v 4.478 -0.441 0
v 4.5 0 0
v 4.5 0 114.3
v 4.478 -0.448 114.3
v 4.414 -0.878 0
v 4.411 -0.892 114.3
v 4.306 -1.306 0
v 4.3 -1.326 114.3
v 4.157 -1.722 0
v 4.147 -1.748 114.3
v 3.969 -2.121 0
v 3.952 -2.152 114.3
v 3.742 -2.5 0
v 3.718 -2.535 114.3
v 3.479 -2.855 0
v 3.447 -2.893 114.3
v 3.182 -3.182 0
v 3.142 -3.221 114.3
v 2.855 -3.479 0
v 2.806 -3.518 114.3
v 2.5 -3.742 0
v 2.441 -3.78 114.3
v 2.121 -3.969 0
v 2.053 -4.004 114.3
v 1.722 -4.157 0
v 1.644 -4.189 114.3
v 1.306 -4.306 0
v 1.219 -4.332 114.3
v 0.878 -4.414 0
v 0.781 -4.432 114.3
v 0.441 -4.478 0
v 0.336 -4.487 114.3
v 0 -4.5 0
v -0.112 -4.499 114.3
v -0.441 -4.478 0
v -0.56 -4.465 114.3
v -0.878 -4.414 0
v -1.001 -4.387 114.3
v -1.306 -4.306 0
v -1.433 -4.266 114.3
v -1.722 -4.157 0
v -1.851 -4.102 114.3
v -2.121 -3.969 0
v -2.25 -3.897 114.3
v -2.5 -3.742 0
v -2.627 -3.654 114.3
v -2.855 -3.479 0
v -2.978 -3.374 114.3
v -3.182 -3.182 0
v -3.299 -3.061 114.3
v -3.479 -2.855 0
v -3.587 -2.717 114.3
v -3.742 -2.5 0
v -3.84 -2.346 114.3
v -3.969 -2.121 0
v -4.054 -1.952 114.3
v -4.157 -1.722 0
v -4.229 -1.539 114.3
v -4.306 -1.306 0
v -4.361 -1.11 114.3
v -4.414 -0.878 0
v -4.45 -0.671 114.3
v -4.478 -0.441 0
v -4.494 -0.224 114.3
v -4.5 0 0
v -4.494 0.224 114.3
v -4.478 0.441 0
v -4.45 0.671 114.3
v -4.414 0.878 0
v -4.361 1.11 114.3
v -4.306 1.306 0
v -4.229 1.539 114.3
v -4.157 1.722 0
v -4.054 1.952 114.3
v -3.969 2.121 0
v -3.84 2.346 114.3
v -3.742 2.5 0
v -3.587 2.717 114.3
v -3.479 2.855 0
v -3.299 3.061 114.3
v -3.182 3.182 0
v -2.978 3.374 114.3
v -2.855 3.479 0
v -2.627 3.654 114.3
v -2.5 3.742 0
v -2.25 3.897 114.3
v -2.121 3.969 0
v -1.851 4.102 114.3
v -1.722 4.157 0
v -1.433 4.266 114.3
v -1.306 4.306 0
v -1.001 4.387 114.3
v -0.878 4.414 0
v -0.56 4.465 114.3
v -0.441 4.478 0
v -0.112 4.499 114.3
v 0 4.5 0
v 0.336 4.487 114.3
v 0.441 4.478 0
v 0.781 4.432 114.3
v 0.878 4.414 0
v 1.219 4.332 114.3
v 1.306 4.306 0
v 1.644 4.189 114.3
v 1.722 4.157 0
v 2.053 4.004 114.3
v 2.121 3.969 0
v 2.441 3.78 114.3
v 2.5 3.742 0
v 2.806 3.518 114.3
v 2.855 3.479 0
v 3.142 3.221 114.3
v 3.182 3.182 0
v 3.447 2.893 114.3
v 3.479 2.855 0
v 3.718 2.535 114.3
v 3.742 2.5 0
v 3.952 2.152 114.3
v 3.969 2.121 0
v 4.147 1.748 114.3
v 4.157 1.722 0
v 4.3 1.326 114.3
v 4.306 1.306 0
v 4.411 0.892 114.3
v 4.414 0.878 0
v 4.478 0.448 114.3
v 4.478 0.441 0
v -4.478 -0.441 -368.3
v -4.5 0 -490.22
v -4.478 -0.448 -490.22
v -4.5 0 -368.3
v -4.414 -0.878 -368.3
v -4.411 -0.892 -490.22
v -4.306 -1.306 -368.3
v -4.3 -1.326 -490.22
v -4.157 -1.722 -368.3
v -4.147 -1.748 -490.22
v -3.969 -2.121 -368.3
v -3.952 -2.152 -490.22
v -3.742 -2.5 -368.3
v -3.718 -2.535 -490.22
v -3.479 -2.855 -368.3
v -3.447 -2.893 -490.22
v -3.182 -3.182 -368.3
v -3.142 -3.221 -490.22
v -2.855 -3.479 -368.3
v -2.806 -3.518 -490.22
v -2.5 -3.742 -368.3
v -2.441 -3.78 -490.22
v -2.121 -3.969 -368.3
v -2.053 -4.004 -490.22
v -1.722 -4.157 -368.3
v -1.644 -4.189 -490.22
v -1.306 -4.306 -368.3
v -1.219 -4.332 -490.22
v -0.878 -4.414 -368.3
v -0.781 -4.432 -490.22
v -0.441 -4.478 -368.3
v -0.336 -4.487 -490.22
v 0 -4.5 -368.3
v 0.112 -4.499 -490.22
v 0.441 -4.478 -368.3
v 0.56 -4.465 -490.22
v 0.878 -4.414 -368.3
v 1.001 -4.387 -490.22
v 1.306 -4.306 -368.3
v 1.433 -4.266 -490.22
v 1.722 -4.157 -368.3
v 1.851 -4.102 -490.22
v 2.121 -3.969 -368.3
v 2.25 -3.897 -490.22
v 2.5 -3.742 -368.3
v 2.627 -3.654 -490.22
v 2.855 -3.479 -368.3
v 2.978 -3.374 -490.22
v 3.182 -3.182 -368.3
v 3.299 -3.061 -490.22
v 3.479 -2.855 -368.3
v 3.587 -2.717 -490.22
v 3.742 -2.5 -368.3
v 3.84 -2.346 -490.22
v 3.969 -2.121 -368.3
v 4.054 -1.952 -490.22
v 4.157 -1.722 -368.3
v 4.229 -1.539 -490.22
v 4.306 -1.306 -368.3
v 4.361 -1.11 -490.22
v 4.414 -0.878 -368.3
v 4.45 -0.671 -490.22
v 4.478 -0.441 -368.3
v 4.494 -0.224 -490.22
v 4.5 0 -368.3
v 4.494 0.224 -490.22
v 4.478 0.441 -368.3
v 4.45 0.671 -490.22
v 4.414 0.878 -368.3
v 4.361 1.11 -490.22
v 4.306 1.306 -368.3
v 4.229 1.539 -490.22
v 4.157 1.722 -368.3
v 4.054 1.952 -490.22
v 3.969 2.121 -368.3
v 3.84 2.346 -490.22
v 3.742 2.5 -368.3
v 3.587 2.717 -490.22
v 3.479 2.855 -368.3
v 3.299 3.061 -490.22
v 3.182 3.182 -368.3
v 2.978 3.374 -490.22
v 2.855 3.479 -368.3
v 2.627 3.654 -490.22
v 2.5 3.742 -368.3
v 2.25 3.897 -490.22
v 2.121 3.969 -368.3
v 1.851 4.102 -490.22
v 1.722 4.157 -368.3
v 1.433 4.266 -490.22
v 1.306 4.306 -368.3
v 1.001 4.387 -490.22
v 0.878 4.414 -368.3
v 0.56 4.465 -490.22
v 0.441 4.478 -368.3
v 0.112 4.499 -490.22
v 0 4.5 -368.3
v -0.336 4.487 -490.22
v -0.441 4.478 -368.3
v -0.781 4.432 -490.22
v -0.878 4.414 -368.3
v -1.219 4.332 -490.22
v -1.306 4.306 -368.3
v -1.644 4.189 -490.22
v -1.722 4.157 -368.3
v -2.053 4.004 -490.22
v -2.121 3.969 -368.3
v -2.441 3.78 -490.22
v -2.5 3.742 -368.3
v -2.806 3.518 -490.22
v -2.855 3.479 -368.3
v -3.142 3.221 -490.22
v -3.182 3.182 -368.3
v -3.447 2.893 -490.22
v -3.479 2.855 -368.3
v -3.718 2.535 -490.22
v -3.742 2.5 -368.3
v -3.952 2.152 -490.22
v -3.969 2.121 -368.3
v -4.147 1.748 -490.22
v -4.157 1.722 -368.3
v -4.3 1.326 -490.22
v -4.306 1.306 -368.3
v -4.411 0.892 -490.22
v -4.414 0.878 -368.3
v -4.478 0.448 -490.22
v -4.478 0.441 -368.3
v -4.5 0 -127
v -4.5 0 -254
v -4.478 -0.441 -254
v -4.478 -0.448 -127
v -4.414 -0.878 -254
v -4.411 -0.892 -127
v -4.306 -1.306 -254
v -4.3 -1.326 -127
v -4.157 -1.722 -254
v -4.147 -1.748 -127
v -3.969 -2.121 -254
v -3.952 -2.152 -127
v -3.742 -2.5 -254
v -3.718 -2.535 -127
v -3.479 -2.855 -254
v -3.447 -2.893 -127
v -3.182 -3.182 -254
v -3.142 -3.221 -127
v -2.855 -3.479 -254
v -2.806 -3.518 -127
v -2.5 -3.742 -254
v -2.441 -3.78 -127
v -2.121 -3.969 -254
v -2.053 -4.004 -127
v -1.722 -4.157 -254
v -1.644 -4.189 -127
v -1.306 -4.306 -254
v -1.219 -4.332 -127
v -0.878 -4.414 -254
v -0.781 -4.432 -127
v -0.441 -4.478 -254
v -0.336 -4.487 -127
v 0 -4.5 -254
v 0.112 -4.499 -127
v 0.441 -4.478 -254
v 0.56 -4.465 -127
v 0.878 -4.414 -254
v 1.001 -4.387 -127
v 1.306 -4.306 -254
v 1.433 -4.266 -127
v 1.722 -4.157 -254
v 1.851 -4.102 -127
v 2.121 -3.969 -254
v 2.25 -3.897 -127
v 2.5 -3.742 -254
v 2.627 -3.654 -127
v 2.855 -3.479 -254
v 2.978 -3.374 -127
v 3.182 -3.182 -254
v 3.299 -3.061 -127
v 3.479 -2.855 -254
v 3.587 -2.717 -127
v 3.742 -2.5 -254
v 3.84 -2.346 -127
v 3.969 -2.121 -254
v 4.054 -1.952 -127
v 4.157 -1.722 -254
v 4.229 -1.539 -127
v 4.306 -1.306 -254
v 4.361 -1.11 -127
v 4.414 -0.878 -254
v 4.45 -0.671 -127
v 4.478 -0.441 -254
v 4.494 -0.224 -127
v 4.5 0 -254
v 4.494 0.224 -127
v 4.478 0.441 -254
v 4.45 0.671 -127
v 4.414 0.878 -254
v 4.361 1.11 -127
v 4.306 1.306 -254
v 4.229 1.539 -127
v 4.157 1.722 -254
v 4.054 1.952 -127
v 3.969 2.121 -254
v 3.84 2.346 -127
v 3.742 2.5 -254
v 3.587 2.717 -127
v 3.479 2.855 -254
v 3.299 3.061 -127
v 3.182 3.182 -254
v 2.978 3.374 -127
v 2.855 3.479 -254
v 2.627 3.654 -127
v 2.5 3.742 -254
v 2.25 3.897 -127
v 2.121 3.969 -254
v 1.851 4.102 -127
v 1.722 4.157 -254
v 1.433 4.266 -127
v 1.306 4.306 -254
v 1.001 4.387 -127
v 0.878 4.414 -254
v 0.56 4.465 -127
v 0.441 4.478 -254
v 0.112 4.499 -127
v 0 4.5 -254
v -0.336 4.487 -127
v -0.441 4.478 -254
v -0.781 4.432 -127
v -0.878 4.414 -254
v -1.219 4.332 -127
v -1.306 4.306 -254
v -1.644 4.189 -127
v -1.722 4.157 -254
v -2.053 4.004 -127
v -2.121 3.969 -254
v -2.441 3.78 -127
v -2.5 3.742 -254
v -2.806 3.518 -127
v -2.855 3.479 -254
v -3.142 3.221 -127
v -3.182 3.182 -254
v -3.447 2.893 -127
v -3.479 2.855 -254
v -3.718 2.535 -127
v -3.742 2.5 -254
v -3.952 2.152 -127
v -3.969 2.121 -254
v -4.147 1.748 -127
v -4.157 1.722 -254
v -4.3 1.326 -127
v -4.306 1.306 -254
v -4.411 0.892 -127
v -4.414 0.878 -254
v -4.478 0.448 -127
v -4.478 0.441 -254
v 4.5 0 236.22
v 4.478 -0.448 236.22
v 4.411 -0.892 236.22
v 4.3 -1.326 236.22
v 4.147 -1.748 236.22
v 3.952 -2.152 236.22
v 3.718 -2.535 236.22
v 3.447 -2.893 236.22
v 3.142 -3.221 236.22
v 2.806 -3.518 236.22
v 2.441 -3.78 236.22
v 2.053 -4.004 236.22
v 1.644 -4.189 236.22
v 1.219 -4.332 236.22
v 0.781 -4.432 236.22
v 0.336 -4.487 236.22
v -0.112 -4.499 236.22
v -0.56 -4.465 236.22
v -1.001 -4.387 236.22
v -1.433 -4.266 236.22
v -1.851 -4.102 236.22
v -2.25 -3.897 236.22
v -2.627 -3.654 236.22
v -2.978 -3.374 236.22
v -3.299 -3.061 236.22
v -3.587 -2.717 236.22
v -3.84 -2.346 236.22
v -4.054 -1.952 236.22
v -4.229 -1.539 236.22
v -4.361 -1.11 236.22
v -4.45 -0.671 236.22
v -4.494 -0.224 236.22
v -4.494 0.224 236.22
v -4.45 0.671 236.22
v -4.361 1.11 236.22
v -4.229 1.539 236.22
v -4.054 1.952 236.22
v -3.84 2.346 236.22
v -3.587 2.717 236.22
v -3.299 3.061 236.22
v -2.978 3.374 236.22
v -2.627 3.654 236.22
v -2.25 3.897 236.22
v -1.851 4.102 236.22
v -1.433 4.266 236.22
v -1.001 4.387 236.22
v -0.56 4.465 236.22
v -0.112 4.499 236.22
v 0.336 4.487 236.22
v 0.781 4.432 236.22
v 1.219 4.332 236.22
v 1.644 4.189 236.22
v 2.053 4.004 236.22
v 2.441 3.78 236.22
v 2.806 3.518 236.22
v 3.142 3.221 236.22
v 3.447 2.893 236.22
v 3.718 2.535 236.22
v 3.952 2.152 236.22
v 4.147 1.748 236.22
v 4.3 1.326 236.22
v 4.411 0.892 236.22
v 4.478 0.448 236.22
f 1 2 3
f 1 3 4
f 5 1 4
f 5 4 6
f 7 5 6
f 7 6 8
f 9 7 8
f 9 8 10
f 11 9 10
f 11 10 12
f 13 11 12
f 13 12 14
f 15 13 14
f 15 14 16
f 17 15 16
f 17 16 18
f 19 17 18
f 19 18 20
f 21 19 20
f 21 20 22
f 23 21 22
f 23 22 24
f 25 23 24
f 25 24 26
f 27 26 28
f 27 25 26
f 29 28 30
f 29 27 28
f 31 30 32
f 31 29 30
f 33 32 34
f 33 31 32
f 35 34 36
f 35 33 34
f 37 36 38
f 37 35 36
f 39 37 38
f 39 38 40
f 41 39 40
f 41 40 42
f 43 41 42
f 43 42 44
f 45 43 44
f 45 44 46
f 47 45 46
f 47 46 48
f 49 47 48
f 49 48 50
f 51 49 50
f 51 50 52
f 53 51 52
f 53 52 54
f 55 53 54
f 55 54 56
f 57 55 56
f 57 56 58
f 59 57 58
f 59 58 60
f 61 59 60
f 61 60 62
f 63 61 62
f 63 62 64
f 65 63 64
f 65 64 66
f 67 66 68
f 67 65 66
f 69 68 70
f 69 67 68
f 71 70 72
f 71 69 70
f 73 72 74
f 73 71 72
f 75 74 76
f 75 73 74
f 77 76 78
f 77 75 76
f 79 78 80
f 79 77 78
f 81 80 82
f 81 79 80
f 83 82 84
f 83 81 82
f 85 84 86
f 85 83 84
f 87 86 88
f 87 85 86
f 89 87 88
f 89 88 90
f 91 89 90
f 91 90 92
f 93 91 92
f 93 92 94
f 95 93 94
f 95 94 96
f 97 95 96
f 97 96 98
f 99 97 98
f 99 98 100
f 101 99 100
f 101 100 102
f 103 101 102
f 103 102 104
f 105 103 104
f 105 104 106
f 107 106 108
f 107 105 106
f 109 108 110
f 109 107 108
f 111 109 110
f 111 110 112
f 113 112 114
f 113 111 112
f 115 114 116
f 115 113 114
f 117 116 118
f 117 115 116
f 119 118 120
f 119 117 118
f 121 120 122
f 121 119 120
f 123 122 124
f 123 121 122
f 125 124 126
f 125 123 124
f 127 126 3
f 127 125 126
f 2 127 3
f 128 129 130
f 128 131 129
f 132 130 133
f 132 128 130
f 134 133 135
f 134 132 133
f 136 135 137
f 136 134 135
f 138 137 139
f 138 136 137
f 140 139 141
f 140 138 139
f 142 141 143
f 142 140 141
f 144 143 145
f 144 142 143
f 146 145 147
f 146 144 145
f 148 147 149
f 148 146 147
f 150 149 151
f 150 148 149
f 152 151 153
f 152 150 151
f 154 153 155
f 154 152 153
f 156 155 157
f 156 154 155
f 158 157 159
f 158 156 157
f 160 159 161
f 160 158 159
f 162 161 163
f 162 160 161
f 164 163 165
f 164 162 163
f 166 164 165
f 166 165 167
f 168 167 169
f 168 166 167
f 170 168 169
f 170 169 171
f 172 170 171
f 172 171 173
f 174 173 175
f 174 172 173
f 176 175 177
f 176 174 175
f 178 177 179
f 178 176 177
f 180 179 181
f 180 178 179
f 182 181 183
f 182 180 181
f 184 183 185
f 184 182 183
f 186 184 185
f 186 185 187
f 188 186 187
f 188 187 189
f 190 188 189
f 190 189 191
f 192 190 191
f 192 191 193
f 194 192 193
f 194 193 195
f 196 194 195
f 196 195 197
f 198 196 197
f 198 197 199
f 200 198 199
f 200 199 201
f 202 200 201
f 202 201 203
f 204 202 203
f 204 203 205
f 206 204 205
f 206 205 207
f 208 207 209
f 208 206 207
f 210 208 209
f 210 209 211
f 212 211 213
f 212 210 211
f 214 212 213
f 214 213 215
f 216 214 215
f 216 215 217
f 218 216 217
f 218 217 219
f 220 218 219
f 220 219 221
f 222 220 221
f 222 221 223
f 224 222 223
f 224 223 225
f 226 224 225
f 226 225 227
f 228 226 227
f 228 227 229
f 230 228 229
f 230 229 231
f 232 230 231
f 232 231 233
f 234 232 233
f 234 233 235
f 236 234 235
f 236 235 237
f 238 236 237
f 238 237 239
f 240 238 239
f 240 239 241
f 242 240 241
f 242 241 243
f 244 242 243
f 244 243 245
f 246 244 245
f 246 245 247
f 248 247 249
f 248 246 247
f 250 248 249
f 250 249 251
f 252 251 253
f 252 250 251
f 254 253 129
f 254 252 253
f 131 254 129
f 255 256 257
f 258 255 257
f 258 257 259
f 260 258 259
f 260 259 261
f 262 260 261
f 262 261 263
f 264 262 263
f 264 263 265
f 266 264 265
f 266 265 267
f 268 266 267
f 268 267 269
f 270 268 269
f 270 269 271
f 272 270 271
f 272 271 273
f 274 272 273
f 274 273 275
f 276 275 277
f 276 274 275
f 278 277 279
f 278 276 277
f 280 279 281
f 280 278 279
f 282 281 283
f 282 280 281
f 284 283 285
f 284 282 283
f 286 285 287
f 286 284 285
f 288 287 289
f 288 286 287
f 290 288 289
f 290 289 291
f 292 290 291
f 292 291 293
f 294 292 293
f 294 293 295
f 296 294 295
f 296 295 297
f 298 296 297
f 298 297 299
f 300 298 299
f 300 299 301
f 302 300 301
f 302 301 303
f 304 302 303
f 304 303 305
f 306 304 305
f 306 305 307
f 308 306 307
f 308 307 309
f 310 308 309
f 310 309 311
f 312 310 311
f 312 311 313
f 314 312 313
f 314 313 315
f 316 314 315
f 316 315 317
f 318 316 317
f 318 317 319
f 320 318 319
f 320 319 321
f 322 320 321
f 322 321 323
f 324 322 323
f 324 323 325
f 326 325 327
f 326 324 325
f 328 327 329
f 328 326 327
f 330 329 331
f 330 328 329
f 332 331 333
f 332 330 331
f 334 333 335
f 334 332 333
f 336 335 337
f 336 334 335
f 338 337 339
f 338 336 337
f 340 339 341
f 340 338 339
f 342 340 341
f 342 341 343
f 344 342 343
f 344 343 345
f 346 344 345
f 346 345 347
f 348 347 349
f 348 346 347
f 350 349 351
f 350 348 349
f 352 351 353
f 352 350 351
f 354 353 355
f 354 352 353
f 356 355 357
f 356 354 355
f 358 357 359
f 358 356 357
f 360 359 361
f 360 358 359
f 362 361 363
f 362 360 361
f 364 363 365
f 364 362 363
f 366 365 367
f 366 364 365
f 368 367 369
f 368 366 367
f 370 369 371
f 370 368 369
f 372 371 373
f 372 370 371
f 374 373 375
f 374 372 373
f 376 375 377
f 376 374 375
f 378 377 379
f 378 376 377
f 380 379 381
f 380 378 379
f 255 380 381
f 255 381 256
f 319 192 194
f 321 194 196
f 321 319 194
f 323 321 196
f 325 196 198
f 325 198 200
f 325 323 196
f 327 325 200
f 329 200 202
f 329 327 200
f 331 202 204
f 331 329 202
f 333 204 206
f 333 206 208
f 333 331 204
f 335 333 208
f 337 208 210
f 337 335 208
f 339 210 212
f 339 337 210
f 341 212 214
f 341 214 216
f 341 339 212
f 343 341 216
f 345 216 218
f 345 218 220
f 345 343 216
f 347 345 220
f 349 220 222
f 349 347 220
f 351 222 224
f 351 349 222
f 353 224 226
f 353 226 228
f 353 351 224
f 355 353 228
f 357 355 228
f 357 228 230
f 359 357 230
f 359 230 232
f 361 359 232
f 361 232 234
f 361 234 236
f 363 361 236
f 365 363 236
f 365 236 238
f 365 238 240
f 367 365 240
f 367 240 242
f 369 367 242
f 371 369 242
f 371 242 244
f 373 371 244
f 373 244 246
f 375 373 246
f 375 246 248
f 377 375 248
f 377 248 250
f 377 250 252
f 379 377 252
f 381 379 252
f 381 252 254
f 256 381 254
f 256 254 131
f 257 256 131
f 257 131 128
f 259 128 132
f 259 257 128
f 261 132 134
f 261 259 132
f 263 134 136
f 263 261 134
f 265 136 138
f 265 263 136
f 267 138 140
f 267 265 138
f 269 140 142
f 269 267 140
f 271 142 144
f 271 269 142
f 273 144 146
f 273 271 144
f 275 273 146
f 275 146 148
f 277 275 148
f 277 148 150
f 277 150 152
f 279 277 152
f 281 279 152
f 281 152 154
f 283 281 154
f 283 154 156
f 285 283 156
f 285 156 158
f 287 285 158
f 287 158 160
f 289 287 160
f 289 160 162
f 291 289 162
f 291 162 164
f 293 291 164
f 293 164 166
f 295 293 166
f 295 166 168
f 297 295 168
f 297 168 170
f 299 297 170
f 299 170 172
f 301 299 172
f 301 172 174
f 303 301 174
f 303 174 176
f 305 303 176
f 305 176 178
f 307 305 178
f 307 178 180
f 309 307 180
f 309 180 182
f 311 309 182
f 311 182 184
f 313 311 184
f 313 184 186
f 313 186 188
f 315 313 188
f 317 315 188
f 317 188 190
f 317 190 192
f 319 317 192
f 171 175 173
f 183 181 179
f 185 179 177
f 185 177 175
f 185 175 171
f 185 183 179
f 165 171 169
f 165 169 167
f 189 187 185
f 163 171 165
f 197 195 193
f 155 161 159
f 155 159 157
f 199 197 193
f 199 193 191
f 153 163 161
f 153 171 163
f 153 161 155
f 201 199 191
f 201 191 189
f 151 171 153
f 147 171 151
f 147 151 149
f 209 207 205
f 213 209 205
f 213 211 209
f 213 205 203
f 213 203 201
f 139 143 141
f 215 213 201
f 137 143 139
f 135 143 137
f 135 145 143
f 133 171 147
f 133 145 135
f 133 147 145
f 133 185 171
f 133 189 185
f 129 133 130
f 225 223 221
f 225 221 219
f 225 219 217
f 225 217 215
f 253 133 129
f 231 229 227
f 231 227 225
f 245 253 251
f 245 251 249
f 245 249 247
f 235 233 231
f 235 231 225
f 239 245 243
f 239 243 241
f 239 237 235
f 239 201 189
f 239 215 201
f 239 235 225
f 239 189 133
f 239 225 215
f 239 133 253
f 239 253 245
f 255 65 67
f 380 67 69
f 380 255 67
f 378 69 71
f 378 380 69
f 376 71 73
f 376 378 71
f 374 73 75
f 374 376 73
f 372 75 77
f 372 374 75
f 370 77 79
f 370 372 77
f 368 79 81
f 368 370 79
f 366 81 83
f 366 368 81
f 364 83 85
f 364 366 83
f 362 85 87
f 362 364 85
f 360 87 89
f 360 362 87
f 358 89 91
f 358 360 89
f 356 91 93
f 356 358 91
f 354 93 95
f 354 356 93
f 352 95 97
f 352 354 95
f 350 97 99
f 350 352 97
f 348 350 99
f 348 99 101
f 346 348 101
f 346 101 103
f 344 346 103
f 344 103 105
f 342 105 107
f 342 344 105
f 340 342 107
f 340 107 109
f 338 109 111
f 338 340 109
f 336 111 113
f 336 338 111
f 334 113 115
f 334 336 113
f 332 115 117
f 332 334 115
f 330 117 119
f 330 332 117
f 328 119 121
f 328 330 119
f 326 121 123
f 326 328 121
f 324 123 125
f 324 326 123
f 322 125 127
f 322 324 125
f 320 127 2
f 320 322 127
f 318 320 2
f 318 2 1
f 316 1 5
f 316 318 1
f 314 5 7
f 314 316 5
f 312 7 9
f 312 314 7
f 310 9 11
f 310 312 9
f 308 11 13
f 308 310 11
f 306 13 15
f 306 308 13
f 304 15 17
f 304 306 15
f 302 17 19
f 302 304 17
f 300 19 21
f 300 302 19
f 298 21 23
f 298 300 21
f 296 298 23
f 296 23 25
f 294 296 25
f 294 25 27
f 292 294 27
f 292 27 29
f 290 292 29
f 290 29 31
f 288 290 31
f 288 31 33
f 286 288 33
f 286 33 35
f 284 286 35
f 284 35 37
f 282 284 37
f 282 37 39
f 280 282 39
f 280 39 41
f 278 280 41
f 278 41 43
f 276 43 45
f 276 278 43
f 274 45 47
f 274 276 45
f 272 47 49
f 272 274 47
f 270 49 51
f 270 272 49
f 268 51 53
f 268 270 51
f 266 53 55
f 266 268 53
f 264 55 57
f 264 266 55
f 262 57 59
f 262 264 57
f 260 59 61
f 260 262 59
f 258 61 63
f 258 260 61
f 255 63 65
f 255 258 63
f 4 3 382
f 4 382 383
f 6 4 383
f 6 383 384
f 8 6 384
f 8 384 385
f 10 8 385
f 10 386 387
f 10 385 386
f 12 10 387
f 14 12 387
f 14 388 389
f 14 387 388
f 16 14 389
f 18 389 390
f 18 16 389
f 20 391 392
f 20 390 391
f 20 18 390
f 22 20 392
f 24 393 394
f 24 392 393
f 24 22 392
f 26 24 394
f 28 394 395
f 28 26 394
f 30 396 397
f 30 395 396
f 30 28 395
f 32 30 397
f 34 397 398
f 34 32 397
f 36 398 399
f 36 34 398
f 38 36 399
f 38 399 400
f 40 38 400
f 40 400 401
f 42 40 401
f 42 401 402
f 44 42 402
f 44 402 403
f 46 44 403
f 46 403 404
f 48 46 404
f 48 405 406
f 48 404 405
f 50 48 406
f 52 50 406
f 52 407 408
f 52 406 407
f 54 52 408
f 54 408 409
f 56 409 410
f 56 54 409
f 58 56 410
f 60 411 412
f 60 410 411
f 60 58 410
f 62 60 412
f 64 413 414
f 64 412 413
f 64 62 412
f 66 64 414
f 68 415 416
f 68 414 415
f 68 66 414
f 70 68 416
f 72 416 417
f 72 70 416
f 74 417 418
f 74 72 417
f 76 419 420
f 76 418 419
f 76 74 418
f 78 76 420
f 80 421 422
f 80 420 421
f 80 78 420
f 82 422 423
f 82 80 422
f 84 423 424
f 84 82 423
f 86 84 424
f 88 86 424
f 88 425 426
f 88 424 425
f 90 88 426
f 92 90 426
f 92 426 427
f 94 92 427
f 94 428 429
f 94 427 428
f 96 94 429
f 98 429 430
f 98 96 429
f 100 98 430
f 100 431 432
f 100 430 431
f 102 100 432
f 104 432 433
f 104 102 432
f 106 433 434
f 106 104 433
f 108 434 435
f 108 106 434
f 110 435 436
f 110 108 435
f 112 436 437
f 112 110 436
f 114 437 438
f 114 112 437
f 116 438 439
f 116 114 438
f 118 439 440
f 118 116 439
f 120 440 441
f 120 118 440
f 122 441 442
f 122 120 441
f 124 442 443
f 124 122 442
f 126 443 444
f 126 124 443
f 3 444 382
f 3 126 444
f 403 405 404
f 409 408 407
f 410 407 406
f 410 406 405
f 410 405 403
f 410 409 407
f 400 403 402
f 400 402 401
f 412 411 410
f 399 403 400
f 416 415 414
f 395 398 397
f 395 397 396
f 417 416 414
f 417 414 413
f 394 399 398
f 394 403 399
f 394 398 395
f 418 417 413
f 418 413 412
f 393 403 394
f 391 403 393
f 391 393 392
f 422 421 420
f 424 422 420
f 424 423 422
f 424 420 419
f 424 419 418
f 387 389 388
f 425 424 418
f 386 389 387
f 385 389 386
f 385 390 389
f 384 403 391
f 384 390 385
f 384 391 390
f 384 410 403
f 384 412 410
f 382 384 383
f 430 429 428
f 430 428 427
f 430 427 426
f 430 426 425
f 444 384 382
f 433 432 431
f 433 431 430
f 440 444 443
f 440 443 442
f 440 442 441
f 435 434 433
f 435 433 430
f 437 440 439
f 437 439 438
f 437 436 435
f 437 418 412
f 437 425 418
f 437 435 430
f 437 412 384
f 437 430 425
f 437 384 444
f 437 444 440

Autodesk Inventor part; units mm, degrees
ref_plane "YZ Plane" through (0, 0, 0) normal (1, 0, 0) x (0, 1, 0)
ref_plane "XZ Plane" through (0, 0, 0) normal (0, 1, 0) x (-1, 0, 0)
sketch "Sketch3" plane through (0, 0, 0) normal (0, 0, 1) x (1, 0, 0)
  circle A0 centre (0, 0) radius 4.5
  dimension "d5" = 9
extrude "Extrusion3" add sketch "Sketch3" along normal blind 114.3
ref_plane "Work Plane2" through (0, 0, -127) normal (0, 0, -1) x (-1, 0, 0)
mirror "Mirror1" about plane through (0, 0, -127) normal (0, 0, -1) of "Extrusion3"
sketch "Sketch5" plane through (0, 0, -127) normal (0, 0, -1) x (-1, 0, 0)
  circle A0 centre (0, 0) radius 4.5
extrude "Extrusion4" add sketch "Sketch5" along normal mid plane 254
sketch "Sketch6" plane through (0, 0, 114.3) normal (0, 0, 1) x (1, 0, 0)
  circle A0 centre (0, 0) radius 4.5
extrude "Extrusion5" add sketch "Sketch6" along normal blind 121.92
sketch "Sketch7" plane through (0, 0, -368.3) normal (0, 0, -1) x (-1, 0, 0)
  circle A0 centre (0, 0) radius 4.5
extrude "Extrusion6" add sketch "Sketch7" along normal blind 121.92
thread "Thread3" size "3/8-16 UNC" class "2A" standard "ANSI Unified Screw Threads" length 111.76
thread "Thread4" size "3/8-16 UNC" class "2A" standard "ANSI Unified Screw Threads" length 111.76
properties part number "Axle"
